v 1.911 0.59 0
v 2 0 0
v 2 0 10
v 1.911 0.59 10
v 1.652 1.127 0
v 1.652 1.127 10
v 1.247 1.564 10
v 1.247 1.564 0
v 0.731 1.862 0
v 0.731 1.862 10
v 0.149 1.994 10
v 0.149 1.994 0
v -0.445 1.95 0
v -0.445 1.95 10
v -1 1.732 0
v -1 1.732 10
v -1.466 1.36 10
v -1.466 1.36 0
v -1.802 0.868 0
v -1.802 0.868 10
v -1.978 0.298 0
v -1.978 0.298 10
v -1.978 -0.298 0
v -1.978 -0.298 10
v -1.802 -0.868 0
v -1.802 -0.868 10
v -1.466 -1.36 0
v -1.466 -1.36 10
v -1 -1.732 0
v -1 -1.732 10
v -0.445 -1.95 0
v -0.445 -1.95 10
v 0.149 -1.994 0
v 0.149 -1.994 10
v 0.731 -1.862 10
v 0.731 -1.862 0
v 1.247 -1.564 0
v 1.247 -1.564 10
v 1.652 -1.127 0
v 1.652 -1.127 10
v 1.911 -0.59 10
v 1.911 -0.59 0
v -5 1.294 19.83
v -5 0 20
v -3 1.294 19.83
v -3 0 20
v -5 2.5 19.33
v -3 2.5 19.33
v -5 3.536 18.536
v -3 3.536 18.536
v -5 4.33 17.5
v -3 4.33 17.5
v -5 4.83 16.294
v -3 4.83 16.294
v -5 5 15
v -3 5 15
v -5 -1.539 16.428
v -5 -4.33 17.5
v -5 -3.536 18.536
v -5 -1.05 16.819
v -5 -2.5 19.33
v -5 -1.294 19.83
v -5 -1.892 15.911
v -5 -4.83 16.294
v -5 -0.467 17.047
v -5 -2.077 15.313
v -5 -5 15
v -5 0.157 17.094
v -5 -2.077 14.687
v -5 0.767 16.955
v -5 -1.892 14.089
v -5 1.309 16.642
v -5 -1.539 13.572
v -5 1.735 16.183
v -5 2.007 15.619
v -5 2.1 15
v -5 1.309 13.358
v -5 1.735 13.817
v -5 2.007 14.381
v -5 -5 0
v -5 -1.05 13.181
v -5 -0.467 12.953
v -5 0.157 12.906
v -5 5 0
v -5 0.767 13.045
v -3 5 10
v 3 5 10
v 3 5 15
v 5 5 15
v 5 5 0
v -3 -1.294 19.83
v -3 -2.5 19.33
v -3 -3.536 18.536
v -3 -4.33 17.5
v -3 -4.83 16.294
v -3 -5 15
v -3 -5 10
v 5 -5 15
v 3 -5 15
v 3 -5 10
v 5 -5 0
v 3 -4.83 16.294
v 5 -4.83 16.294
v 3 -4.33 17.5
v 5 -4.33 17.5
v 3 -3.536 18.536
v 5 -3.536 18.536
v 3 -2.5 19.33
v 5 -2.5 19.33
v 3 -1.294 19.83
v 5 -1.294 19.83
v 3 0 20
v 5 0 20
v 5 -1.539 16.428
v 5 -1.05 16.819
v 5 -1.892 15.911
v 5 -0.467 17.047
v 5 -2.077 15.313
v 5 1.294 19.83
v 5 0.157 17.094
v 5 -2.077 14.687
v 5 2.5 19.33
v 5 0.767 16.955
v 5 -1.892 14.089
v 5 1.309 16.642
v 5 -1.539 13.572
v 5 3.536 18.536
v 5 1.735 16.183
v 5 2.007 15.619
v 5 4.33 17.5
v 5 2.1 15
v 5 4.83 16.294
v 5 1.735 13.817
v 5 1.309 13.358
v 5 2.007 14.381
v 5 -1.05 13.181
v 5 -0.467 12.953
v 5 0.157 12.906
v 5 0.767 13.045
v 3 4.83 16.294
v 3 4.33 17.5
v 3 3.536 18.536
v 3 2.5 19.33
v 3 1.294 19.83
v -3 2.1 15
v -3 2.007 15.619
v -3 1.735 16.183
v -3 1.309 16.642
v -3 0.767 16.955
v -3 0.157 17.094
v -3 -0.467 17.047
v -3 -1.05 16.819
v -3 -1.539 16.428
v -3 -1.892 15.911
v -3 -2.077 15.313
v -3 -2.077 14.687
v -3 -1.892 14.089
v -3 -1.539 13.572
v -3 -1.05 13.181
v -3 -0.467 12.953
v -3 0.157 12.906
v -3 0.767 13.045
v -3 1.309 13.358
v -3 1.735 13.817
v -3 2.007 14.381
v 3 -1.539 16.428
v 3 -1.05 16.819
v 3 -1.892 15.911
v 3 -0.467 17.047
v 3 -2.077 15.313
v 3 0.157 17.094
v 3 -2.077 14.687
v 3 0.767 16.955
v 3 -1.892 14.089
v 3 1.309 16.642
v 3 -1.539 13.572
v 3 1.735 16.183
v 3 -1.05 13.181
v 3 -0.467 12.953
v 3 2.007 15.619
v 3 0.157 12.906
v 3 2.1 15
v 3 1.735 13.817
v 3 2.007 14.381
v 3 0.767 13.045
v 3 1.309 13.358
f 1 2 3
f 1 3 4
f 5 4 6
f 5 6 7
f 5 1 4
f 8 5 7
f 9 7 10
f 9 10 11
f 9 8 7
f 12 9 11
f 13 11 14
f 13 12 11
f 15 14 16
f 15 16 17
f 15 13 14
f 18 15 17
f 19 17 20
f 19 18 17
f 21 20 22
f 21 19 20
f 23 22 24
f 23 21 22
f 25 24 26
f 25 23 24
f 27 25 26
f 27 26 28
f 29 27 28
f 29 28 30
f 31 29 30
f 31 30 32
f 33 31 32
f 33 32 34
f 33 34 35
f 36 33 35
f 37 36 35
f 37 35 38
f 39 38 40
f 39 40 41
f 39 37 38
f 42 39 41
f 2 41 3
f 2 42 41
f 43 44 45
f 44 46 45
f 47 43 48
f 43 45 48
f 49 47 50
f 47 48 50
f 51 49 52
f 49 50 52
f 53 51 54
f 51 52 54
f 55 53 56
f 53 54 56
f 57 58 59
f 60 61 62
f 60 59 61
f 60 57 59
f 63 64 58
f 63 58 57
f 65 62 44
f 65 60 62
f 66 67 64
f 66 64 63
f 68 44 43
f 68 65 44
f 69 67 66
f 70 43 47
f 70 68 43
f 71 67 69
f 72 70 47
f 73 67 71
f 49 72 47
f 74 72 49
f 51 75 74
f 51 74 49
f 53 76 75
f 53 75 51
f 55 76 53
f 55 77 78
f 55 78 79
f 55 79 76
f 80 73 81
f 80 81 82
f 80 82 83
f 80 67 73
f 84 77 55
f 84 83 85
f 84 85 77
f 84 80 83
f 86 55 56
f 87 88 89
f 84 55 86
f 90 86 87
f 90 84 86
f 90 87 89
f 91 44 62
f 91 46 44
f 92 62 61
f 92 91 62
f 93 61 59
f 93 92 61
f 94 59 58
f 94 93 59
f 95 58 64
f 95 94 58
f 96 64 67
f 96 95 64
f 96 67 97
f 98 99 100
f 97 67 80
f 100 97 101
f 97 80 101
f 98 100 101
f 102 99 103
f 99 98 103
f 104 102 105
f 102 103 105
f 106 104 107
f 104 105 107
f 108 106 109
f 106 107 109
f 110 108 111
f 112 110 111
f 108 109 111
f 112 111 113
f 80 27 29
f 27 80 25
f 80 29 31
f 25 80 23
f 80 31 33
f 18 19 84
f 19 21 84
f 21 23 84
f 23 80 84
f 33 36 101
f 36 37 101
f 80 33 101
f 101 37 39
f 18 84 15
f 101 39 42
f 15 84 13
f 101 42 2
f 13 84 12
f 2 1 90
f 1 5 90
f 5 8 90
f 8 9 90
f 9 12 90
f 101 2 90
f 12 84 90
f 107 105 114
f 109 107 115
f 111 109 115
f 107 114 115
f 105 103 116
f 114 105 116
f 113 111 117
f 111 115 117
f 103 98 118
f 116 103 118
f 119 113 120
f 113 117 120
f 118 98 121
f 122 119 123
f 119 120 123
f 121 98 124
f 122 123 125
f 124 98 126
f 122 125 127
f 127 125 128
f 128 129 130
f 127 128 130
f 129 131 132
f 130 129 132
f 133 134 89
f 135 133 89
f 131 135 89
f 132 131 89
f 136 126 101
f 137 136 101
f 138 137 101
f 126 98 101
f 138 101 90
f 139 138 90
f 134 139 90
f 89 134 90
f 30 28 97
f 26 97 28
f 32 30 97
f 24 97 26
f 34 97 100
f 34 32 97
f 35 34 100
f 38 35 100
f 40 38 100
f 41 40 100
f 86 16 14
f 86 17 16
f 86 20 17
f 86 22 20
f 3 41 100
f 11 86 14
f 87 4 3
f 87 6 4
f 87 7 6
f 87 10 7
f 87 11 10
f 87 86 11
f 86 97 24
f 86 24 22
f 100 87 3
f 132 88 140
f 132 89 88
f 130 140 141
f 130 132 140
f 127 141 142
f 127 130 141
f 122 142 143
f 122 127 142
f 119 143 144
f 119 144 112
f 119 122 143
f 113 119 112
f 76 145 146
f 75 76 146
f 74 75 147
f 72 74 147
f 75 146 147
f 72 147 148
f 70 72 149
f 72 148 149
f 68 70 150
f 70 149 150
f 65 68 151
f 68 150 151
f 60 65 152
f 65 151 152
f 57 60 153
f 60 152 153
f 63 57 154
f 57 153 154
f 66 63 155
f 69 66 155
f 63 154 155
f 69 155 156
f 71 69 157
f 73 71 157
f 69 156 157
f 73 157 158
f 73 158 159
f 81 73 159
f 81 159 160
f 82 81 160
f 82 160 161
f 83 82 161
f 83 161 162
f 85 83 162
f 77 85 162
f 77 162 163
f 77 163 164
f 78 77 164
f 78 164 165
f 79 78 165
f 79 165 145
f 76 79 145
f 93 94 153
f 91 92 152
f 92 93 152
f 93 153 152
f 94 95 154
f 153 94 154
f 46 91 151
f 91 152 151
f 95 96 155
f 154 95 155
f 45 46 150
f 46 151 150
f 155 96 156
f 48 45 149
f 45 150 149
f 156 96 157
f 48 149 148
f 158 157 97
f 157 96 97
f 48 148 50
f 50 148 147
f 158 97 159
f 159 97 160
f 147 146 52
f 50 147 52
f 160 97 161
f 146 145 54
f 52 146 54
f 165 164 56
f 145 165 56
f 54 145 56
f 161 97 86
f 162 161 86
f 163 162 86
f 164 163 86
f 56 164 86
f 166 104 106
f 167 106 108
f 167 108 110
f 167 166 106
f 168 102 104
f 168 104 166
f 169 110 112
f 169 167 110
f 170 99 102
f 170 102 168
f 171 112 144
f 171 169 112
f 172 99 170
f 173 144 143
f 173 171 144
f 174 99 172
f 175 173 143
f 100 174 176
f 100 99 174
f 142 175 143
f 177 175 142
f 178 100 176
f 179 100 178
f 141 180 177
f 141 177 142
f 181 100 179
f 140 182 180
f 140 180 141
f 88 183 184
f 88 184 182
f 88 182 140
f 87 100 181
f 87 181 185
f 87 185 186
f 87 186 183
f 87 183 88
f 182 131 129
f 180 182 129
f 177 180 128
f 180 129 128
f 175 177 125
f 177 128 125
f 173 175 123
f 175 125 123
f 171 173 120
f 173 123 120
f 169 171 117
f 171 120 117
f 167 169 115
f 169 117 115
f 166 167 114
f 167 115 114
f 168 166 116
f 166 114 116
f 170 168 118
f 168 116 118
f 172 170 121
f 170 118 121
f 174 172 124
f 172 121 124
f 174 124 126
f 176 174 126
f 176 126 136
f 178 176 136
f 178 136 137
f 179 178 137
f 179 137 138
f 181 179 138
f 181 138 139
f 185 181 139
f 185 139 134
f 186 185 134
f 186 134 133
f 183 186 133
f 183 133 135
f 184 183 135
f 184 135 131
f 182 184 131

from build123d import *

# Parameters (mm, degrees)
SKETCH_1_W          = 10
SKETCH_1_H          = 10
SKETCH_1_R          = 2
EXTRUDE_1_DEPTH     = 10
SKETCH_2_W          = 2
SKETCH_2_H          = 10
EXTRUDE_2_DEPTH     = 10
SKETCH_3_R          = 2.1
CUT_EXTRUDE_1_DEPTH = 10
FILLET_1_R          = 5


with BuildPart() as part:
    # ｽｹｯﾁ1 → ﾎﾞｽ - 押し出し1 (new body)
    with BuildSketch(Plane.XY):
        Rectangle(SKETCH_1_W, SKETCH_1_H)
        Circle(SKETCH_1_R, mode=Mode.SUBTRACT)
    extrude(amount=EXTRUDE_1_DEPTH)

    # ｽｹｯﾁ2 → ﾎﾞｽ - 押し出し2 (add)
    with BuildSketch(Plane.XY.offset(10)):
        with Locations((-4, 0)):
            Rectangle(SKETCH_2_W, SKETCH_2_H)
        with Locations((4, 0)):
            Rectangle(SKETCH_2_W, SKETCH_2_H)
    extrude(amount=EXTRUDE_2_DEPTH)

    # ｽｹｯﾁ3 → ｶｯﾄ - 押し出し1 (cut)
    with BuildSketch(Plane(origin=(5, 0, 0), x_dir=(0, 0, -1), z_dir=(1, 0, 0))):
        with Locations(Location((-15, 0, 0), (0, 0, 90))):
            Circle(SKETCH_3_R)
    extrude(amount=-CUT_EXTRUDE_1_DEPTH, mode=Mode.SUBTRACT)

    # ﾌｨﾚｯﾄ1
    fillet_1_edges = [part.edges().sort_by_distance(p)[0] for p in [
        (4, -5, 20),
        (4, 5, 20),
        (-4, 5, 20),
        (-4, -5, 20),
    ]]
    fillet(fillet_1_edges, radius=FILLET_1_R - 0.0001)  # a hair under: the kernel refuses the full size


solid = part.part
